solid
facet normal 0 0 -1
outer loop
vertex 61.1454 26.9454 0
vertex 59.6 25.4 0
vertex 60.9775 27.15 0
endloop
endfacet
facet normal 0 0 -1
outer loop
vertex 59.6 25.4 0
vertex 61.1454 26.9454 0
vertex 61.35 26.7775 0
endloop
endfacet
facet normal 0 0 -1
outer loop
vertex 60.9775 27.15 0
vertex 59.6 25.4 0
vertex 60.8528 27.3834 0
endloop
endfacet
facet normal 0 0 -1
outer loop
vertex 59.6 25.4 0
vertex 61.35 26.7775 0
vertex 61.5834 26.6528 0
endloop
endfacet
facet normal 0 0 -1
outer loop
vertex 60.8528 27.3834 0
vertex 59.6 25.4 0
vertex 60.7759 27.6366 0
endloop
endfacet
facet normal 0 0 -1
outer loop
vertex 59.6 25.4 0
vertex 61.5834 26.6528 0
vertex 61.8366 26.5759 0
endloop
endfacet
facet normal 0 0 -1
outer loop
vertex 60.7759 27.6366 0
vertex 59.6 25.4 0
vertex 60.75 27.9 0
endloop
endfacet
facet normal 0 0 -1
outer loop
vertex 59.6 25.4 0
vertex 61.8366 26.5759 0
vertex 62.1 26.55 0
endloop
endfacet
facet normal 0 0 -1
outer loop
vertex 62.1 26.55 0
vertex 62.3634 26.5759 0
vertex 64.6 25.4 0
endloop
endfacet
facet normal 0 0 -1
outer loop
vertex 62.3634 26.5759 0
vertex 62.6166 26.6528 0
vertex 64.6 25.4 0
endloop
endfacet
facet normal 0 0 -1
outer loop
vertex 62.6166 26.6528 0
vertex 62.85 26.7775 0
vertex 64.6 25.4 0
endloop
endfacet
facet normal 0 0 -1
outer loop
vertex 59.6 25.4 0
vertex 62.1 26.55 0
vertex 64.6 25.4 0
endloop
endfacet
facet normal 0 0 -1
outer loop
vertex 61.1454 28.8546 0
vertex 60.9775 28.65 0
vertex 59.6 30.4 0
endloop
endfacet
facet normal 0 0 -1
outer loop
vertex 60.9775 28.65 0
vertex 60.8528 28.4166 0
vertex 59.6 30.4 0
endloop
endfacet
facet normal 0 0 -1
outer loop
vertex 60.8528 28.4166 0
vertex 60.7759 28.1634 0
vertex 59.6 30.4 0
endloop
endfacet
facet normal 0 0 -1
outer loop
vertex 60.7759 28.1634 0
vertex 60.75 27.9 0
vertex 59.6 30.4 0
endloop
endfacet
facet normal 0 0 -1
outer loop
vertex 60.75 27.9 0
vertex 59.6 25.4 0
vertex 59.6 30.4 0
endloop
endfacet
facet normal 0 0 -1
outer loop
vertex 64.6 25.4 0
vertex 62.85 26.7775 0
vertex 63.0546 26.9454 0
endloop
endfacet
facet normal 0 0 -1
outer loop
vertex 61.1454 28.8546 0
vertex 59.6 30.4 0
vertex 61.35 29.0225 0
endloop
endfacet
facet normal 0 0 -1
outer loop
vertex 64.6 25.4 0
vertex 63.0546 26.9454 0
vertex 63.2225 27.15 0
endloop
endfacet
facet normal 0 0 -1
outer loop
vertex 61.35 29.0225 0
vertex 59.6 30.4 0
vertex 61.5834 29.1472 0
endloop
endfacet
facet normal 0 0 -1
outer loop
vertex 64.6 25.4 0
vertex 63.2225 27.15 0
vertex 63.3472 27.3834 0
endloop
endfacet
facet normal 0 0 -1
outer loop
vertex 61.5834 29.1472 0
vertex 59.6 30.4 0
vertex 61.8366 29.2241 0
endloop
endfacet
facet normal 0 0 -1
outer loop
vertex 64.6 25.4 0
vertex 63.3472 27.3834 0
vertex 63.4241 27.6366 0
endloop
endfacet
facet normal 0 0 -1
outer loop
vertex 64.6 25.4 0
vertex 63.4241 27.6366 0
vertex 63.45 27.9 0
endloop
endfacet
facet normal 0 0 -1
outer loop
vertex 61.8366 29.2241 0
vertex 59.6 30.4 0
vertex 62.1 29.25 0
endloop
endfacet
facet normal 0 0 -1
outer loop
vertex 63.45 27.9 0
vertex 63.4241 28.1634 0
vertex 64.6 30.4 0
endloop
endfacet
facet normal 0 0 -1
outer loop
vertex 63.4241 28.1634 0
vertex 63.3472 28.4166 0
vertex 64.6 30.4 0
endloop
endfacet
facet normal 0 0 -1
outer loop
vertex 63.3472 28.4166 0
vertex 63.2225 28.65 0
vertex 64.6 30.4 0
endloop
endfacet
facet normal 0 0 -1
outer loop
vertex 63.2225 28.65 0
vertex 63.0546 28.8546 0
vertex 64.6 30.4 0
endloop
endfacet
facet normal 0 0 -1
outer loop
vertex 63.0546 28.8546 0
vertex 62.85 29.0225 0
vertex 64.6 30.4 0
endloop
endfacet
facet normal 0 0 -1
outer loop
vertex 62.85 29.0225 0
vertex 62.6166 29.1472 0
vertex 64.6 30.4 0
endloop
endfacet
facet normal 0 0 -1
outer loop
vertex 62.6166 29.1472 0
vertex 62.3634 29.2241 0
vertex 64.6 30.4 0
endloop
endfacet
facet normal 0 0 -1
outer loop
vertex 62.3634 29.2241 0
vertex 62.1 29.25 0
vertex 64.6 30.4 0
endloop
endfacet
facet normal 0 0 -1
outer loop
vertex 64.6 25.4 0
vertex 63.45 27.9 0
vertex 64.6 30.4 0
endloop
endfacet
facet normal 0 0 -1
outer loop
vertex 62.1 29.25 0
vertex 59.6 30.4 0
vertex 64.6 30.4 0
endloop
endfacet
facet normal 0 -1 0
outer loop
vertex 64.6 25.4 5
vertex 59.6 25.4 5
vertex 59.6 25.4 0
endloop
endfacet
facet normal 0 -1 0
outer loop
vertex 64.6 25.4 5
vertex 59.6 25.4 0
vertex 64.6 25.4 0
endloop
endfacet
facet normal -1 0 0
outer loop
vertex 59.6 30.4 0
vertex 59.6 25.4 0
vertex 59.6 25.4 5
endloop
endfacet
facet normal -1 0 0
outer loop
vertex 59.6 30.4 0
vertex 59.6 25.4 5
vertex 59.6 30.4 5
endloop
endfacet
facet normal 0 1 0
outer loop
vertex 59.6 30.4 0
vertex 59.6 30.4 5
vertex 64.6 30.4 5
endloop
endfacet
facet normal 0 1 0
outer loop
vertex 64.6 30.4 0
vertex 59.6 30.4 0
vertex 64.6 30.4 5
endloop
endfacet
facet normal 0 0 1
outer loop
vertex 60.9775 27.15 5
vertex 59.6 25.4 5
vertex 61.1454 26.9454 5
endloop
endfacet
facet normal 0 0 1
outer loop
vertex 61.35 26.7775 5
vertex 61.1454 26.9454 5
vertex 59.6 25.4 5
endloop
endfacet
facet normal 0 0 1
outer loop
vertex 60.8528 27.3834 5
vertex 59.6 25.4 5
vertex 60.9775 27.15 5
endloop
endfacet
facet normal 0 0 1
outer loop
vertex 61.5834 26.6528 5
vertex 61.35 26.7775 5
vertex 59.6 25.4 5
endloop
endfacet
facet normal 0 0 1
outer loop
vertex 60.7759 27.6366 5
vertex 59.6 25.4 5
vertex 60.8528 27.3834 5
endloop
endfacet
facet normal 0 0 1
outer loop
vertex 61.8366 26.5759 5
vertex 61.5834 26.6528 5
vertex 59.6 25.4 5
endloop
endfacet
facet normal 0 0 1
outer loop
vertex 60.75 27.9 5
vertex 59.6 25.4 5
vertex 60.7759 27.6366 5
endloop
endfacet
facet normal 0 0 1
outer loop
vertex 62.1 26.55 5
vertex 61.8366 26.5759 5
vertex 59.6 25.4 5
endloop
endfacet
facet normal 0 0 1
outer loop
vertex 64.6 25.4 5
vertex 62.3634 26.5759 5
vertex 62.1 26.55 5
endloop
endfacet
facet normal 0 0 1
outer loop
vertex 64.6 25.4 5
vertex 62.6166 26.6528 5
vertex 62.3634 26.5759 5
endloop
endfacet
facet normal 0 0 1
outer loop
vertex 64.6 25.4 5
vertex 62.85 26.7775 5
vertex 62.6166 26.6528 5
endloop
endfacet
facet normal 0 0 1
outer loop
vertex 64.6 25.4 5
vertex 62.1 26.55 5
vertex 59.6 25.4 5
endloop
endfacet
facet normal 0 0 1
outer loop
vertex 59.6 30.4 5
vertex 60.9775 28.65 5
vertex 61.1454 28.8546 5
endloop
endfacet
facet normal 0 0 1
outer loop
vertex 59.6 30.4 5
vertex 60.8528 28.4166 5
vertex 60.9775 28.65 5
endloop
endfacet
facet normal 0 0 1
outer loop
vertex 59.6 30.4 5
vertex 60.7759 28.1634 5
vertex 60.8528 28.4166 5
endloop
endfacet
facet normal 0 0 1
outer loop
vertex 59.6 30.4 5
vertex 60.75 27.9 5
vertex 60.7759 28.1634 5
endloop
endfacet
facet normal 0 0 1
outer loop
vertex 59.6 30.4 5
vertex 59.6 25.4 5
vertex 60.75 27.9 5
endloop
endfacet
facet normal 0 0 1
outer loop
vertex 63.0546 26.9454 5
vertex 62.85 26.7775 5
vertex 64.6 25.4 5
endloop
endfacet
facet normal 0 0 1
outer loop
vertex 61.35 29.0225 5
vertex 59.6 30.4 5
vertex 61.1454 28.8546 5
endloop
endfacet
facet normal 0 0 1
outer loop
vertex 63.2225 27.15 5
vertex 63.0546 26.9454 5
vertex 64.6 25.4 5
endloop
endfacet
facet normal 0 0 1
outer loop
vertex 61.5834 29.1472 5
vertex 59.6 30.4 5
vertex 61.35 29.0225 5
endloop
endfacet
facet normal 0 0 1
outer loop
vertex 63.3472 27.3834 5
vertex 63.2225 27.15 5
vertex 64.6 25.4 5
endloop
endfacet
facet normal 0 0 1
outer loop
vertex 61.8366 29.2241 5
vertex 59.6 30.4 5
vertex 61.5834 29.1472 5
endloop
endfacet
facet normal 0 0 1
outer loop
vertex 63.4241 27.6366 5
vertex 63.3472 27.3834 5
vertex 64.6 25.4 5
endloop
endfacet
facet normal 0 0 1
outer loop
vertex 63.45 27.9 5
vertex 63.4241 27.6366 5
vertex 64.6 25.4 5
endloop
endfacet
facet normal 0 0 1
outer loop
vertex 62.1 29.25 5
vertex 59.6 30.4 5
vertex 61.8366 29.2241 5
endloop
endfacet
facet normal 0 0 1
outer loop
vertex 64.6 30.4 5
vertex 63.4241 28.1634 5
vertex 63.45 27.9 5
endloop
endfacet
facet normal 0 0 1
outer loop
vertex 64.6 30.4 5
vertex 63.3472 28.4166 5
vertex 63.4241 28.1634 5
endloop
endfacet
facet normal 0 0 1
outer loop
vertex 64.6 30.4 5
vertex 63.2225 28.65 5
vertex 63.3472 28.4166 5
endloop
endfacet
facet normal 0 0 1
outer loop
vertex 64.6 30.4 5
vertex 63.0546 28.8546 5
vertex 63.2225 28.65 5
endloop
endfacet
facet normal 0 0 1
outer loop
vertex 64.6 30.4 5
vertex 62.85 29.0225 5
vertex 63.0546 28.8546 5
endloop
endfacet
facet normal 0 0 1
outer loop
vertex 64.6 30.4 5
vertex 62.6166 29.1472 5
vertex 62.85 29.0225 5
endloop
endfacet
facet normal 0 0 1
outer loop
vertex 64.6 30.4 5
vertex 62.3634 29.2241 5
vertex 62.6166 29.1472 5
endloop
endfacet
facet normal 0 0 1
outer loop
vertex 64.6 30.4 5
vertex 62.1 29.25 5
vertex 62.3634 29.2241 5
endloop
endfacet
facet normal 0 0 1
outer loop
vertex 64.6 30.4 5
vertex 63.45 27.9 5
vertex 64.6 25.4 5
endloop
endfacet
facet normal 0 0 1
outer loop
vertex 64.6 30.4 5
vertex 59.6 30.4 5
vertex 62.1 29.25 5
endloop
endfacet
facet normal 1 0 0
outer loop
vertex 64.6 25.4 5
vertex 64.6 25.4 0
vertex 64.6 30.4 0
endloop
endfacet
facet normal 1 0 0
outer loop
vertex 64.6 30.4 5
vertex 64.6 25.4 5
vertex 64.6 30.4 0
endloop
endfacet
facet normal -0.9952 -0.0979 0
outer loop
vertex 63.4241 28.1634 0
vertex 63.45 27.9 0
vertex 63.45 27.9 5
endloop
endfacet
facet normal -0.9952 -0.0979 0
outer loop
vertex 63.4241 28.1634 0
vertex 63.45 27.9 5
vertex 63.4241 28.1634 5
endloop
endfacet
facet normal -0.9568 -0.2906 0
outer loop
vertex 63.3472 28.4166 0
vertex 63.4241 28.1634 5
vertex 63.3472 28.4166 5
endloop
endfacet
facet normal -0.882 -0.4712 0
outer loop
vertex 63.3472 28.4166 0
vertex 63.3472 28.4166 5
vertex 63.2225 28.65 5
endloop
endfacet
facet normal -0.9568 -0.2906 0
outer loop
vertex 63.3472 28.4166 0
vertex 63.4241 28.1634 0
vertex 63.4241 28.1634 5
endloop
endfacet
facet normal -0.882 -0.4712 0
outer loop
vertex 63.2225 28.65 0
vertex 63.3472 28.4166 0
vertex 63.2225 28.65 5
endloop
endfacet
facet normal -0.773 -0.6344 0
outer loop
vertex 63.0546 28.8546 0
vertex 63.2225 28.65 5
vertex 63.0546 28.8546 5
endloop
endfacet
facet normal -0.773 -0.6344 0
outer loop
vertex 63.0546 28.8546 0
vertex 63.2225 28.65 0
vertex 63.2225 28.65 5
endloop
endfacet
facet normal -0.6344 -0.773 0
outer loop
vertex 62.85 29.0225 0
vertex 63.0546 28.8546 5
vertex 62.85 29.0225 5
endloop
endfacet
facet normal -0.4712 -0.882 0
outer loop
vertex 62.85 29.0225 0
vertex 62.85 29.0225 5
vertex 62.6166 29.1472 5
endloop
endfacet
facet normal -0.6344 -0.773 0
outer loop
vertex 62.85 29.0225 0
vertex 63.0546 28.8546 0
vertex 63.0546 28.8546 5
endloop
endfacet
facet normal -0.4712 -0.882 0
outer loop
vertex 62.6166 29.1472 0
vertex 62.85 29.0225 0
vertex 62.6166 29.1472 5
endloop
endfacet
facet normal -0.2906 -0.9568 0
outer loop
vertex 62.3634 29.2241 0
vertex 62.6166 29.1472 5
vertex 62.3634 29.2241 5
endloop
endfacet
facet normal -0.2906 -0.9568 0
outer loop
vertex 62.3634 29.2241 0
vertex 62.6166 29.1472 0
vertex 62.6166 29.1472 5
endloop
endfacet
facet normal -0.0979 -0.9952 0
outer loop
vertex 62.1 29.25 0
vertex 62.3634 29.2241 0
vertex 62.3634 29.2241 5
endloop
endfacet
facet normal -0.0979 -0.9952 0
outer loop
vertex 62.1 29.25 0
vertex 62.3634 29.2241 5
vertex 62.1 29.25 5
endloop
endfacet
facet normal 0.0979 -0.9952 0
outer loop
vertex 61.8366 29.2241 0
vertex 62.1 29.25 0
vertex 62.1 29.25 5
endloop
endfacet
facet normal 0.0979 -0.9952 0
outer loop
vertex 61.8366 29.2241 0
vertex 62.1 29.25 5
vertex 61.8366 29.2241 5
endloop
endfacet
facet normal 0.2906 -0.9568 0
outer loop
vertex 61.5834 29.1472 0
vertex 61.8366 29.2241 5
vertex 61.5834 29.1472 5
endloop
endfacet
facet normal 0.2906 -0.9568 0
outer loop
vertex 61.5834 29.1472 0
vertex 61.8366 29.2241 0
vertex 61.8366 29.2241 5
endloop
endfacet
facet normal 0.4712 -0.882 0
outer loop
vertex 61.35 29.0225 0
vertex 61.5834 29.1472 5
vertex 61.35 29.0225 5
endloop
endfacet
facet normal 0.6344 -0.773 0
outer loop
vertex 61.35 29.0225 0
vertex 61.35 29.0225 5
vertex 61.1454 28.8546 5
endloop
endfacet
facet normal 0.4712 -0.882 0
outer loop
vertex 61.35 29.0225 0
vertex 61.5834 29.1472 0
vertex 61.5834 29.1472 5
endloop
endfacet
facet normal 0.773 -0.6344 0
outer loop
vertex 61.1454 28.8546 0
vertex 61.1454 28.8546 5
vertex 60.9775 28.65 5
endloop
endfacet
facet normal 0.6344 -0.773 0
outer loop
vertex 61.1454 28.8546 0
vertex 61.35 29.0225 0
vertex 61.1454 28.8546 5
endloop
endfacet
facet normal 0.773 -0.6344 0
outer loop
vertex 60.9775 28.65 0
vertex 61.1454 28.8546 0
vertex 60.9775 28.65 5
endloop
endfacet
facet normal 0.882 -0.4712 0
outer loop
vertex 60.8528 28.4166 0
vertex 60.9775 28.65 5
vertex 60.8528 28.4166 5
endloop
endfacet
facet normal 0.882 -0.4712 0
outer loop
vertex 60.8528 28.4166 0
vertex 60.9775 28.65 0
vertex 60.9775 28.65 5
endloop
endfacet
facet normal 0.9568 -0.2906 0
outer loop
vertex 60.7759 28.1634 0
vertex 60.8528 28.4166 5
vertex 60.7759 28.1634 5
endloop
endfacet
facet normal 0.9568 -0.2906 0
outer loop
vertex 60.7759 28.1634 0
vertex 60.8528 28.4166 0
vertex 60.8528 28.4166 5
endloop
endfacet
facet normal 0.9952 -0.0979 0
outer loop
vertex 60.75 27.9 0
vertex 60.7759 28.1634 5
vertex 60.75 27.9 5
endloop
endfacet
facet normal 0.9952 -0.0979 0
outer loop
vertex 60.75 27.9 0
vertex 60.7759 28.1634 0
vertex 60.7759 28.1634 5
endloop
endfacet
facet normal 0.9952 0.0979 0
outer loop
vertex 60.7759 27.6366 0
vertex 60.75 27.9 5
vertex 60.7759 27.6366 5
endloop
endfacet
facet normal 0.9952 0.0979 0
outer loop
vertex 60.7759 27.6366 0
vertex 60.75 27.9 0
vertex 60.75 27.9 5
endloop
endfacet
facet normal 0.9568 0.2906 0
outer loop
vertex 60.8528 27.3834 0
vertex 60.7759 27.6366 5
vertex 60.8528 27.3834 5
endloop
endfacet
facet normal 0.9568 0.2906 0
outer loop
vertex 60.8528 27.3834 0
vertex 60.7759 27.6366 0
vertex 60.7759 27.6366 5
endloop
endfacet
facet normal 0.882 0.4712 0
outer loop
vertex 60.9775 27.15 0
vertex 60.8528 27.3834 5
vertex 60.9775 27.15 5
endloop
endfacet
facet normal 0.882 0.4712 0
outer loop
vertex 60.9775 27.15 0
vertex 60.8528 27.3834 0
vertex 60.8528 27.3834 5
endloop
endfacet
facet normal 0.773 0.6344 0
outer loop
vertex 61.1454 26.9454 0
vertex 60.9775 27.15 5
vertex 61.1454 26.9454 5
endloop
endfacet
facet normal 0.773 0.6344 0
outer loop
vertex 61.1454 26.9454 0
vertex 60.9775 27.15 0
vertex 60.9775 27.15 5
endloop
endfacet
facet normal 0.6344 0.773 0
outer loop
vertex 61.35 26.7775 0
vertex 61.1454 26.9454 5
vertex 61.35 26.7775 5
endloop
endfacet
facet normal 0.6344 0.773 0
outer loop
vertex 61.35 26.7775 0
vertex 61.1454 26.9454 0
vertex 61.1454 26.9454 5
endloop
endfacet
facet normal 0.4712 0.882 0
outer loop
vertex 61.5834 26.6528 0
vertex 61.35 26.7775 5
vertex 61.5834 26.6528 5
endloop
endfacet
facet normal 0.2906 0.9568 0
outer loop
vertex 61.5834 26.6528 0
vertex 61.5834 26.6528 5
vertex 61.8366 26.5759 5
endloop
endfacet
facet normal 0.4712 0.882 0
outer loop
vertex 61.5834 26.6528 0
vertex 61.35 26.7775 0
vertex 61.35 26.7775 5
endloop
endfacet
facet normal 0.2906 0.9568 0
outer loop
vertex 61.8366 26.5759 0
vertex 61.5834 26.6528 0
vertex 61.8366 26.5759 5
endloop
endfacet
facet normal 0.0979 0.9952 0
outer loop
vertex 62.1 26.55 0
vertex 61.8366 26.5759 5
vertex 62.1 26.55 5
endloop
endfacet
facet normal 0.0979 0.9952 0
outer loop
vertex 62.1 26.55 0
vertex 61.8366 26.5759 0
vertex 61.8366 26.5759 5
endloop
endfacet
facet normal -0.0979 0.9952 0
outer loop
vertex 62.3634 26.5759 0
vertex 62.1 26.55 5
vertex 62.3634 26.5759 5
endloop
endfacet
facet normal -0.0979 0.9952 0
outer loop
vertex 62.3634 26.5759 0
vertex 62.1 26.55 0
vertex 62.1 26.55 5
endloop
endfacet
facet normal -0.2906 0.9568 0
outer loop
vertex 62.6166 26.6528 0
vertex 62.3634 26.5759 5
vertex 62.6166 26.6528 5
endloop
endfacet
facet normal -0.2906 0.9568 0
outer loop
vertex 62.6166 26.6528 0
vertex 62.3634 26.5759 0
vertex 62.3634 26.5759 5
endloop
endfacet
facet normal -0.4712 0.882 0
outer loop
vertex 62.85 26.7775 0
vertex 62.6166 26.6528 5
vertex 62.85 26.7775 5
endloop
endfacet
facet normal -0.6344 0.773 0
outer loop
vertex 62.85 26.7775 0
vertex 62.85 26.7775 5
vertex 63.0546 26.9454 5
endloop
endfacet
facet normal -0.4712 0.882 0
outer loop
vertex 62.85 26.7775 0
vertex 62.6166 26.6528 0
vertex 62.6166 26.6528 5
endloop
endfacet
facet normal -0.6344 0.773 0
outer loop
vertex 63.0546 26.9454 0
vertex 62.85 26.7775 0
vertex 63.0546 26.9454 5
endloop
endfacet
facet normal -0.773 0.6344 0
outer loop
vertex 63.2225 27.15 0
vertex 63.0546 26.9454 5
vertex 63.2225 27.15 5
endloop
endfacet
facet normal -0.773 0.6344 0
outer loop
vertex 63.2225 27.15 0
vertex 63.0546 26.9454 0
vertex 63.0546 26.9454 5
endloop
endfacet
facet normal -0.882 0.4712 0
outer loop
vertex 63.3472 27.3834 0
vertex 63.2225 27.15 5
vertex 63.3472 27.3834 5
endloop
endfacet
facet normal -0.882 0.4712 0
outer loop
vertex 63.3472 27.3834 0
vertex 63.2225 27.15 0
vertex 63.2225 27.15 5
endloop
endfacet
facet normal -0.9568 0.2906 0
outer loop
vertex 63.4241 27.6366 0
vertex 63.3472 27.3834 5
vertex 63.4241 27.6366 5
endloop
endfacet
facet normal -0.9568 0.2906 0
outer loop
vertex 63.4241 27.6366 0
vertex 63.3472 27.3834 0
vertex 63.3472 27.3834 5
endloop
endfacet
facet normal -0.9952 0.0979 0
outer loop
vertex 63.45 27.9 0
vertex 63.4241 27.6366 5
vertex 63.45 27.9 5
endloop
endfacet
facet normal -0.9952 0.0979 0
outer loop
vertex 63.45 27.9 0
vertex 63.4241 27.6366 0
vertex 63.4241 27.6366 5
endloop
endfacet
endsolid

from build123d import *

# Parameters (mm, degrees)
CYLINDER002002001001001001001001006_R     = 1.35
CYLINDER002002001001001001001001006_DEPTH = 5
BOX005_W                                  = 5
BOX005_H                                  = 5
BOX005_DEPTH                              = 5


with BuildPart() as cylinder002002001001001001001001006:
    # Cylinder002002001001001001001001006 → Cylinder002002001001001001001001006 (new body)
    with BuildSketch(Plane(origin=(62.1, 27.9, 0), x_dir=(1, 0, 0), z_dir=(0, 0, 1))):
        Circle(CYLINDER002002001001001001001001006_R)
    extrude(amount=CYLINDER002002001001001001001001006_DEPTH)


with BuildPart() as cut013003020:
    # Box005 → Box005 (new body)
    with BuildSketch(Plane(origin=(59.6, 25.4, 0), x_dir=(1, 0, 0), z_dir=(0, 0, 1))):
        with Locations((2.5, 2.5)):
            Rectangle(BOX005_W, BOX005_H)
    extrude(amount=BOX005_DEPTH)

    # Cut013003020: cut Cylinder002002001001001001001001006
    add(cylinder002002001001001001001001006.part, mode=Mode.SUBTRACT)


solid = cut013003020.part
